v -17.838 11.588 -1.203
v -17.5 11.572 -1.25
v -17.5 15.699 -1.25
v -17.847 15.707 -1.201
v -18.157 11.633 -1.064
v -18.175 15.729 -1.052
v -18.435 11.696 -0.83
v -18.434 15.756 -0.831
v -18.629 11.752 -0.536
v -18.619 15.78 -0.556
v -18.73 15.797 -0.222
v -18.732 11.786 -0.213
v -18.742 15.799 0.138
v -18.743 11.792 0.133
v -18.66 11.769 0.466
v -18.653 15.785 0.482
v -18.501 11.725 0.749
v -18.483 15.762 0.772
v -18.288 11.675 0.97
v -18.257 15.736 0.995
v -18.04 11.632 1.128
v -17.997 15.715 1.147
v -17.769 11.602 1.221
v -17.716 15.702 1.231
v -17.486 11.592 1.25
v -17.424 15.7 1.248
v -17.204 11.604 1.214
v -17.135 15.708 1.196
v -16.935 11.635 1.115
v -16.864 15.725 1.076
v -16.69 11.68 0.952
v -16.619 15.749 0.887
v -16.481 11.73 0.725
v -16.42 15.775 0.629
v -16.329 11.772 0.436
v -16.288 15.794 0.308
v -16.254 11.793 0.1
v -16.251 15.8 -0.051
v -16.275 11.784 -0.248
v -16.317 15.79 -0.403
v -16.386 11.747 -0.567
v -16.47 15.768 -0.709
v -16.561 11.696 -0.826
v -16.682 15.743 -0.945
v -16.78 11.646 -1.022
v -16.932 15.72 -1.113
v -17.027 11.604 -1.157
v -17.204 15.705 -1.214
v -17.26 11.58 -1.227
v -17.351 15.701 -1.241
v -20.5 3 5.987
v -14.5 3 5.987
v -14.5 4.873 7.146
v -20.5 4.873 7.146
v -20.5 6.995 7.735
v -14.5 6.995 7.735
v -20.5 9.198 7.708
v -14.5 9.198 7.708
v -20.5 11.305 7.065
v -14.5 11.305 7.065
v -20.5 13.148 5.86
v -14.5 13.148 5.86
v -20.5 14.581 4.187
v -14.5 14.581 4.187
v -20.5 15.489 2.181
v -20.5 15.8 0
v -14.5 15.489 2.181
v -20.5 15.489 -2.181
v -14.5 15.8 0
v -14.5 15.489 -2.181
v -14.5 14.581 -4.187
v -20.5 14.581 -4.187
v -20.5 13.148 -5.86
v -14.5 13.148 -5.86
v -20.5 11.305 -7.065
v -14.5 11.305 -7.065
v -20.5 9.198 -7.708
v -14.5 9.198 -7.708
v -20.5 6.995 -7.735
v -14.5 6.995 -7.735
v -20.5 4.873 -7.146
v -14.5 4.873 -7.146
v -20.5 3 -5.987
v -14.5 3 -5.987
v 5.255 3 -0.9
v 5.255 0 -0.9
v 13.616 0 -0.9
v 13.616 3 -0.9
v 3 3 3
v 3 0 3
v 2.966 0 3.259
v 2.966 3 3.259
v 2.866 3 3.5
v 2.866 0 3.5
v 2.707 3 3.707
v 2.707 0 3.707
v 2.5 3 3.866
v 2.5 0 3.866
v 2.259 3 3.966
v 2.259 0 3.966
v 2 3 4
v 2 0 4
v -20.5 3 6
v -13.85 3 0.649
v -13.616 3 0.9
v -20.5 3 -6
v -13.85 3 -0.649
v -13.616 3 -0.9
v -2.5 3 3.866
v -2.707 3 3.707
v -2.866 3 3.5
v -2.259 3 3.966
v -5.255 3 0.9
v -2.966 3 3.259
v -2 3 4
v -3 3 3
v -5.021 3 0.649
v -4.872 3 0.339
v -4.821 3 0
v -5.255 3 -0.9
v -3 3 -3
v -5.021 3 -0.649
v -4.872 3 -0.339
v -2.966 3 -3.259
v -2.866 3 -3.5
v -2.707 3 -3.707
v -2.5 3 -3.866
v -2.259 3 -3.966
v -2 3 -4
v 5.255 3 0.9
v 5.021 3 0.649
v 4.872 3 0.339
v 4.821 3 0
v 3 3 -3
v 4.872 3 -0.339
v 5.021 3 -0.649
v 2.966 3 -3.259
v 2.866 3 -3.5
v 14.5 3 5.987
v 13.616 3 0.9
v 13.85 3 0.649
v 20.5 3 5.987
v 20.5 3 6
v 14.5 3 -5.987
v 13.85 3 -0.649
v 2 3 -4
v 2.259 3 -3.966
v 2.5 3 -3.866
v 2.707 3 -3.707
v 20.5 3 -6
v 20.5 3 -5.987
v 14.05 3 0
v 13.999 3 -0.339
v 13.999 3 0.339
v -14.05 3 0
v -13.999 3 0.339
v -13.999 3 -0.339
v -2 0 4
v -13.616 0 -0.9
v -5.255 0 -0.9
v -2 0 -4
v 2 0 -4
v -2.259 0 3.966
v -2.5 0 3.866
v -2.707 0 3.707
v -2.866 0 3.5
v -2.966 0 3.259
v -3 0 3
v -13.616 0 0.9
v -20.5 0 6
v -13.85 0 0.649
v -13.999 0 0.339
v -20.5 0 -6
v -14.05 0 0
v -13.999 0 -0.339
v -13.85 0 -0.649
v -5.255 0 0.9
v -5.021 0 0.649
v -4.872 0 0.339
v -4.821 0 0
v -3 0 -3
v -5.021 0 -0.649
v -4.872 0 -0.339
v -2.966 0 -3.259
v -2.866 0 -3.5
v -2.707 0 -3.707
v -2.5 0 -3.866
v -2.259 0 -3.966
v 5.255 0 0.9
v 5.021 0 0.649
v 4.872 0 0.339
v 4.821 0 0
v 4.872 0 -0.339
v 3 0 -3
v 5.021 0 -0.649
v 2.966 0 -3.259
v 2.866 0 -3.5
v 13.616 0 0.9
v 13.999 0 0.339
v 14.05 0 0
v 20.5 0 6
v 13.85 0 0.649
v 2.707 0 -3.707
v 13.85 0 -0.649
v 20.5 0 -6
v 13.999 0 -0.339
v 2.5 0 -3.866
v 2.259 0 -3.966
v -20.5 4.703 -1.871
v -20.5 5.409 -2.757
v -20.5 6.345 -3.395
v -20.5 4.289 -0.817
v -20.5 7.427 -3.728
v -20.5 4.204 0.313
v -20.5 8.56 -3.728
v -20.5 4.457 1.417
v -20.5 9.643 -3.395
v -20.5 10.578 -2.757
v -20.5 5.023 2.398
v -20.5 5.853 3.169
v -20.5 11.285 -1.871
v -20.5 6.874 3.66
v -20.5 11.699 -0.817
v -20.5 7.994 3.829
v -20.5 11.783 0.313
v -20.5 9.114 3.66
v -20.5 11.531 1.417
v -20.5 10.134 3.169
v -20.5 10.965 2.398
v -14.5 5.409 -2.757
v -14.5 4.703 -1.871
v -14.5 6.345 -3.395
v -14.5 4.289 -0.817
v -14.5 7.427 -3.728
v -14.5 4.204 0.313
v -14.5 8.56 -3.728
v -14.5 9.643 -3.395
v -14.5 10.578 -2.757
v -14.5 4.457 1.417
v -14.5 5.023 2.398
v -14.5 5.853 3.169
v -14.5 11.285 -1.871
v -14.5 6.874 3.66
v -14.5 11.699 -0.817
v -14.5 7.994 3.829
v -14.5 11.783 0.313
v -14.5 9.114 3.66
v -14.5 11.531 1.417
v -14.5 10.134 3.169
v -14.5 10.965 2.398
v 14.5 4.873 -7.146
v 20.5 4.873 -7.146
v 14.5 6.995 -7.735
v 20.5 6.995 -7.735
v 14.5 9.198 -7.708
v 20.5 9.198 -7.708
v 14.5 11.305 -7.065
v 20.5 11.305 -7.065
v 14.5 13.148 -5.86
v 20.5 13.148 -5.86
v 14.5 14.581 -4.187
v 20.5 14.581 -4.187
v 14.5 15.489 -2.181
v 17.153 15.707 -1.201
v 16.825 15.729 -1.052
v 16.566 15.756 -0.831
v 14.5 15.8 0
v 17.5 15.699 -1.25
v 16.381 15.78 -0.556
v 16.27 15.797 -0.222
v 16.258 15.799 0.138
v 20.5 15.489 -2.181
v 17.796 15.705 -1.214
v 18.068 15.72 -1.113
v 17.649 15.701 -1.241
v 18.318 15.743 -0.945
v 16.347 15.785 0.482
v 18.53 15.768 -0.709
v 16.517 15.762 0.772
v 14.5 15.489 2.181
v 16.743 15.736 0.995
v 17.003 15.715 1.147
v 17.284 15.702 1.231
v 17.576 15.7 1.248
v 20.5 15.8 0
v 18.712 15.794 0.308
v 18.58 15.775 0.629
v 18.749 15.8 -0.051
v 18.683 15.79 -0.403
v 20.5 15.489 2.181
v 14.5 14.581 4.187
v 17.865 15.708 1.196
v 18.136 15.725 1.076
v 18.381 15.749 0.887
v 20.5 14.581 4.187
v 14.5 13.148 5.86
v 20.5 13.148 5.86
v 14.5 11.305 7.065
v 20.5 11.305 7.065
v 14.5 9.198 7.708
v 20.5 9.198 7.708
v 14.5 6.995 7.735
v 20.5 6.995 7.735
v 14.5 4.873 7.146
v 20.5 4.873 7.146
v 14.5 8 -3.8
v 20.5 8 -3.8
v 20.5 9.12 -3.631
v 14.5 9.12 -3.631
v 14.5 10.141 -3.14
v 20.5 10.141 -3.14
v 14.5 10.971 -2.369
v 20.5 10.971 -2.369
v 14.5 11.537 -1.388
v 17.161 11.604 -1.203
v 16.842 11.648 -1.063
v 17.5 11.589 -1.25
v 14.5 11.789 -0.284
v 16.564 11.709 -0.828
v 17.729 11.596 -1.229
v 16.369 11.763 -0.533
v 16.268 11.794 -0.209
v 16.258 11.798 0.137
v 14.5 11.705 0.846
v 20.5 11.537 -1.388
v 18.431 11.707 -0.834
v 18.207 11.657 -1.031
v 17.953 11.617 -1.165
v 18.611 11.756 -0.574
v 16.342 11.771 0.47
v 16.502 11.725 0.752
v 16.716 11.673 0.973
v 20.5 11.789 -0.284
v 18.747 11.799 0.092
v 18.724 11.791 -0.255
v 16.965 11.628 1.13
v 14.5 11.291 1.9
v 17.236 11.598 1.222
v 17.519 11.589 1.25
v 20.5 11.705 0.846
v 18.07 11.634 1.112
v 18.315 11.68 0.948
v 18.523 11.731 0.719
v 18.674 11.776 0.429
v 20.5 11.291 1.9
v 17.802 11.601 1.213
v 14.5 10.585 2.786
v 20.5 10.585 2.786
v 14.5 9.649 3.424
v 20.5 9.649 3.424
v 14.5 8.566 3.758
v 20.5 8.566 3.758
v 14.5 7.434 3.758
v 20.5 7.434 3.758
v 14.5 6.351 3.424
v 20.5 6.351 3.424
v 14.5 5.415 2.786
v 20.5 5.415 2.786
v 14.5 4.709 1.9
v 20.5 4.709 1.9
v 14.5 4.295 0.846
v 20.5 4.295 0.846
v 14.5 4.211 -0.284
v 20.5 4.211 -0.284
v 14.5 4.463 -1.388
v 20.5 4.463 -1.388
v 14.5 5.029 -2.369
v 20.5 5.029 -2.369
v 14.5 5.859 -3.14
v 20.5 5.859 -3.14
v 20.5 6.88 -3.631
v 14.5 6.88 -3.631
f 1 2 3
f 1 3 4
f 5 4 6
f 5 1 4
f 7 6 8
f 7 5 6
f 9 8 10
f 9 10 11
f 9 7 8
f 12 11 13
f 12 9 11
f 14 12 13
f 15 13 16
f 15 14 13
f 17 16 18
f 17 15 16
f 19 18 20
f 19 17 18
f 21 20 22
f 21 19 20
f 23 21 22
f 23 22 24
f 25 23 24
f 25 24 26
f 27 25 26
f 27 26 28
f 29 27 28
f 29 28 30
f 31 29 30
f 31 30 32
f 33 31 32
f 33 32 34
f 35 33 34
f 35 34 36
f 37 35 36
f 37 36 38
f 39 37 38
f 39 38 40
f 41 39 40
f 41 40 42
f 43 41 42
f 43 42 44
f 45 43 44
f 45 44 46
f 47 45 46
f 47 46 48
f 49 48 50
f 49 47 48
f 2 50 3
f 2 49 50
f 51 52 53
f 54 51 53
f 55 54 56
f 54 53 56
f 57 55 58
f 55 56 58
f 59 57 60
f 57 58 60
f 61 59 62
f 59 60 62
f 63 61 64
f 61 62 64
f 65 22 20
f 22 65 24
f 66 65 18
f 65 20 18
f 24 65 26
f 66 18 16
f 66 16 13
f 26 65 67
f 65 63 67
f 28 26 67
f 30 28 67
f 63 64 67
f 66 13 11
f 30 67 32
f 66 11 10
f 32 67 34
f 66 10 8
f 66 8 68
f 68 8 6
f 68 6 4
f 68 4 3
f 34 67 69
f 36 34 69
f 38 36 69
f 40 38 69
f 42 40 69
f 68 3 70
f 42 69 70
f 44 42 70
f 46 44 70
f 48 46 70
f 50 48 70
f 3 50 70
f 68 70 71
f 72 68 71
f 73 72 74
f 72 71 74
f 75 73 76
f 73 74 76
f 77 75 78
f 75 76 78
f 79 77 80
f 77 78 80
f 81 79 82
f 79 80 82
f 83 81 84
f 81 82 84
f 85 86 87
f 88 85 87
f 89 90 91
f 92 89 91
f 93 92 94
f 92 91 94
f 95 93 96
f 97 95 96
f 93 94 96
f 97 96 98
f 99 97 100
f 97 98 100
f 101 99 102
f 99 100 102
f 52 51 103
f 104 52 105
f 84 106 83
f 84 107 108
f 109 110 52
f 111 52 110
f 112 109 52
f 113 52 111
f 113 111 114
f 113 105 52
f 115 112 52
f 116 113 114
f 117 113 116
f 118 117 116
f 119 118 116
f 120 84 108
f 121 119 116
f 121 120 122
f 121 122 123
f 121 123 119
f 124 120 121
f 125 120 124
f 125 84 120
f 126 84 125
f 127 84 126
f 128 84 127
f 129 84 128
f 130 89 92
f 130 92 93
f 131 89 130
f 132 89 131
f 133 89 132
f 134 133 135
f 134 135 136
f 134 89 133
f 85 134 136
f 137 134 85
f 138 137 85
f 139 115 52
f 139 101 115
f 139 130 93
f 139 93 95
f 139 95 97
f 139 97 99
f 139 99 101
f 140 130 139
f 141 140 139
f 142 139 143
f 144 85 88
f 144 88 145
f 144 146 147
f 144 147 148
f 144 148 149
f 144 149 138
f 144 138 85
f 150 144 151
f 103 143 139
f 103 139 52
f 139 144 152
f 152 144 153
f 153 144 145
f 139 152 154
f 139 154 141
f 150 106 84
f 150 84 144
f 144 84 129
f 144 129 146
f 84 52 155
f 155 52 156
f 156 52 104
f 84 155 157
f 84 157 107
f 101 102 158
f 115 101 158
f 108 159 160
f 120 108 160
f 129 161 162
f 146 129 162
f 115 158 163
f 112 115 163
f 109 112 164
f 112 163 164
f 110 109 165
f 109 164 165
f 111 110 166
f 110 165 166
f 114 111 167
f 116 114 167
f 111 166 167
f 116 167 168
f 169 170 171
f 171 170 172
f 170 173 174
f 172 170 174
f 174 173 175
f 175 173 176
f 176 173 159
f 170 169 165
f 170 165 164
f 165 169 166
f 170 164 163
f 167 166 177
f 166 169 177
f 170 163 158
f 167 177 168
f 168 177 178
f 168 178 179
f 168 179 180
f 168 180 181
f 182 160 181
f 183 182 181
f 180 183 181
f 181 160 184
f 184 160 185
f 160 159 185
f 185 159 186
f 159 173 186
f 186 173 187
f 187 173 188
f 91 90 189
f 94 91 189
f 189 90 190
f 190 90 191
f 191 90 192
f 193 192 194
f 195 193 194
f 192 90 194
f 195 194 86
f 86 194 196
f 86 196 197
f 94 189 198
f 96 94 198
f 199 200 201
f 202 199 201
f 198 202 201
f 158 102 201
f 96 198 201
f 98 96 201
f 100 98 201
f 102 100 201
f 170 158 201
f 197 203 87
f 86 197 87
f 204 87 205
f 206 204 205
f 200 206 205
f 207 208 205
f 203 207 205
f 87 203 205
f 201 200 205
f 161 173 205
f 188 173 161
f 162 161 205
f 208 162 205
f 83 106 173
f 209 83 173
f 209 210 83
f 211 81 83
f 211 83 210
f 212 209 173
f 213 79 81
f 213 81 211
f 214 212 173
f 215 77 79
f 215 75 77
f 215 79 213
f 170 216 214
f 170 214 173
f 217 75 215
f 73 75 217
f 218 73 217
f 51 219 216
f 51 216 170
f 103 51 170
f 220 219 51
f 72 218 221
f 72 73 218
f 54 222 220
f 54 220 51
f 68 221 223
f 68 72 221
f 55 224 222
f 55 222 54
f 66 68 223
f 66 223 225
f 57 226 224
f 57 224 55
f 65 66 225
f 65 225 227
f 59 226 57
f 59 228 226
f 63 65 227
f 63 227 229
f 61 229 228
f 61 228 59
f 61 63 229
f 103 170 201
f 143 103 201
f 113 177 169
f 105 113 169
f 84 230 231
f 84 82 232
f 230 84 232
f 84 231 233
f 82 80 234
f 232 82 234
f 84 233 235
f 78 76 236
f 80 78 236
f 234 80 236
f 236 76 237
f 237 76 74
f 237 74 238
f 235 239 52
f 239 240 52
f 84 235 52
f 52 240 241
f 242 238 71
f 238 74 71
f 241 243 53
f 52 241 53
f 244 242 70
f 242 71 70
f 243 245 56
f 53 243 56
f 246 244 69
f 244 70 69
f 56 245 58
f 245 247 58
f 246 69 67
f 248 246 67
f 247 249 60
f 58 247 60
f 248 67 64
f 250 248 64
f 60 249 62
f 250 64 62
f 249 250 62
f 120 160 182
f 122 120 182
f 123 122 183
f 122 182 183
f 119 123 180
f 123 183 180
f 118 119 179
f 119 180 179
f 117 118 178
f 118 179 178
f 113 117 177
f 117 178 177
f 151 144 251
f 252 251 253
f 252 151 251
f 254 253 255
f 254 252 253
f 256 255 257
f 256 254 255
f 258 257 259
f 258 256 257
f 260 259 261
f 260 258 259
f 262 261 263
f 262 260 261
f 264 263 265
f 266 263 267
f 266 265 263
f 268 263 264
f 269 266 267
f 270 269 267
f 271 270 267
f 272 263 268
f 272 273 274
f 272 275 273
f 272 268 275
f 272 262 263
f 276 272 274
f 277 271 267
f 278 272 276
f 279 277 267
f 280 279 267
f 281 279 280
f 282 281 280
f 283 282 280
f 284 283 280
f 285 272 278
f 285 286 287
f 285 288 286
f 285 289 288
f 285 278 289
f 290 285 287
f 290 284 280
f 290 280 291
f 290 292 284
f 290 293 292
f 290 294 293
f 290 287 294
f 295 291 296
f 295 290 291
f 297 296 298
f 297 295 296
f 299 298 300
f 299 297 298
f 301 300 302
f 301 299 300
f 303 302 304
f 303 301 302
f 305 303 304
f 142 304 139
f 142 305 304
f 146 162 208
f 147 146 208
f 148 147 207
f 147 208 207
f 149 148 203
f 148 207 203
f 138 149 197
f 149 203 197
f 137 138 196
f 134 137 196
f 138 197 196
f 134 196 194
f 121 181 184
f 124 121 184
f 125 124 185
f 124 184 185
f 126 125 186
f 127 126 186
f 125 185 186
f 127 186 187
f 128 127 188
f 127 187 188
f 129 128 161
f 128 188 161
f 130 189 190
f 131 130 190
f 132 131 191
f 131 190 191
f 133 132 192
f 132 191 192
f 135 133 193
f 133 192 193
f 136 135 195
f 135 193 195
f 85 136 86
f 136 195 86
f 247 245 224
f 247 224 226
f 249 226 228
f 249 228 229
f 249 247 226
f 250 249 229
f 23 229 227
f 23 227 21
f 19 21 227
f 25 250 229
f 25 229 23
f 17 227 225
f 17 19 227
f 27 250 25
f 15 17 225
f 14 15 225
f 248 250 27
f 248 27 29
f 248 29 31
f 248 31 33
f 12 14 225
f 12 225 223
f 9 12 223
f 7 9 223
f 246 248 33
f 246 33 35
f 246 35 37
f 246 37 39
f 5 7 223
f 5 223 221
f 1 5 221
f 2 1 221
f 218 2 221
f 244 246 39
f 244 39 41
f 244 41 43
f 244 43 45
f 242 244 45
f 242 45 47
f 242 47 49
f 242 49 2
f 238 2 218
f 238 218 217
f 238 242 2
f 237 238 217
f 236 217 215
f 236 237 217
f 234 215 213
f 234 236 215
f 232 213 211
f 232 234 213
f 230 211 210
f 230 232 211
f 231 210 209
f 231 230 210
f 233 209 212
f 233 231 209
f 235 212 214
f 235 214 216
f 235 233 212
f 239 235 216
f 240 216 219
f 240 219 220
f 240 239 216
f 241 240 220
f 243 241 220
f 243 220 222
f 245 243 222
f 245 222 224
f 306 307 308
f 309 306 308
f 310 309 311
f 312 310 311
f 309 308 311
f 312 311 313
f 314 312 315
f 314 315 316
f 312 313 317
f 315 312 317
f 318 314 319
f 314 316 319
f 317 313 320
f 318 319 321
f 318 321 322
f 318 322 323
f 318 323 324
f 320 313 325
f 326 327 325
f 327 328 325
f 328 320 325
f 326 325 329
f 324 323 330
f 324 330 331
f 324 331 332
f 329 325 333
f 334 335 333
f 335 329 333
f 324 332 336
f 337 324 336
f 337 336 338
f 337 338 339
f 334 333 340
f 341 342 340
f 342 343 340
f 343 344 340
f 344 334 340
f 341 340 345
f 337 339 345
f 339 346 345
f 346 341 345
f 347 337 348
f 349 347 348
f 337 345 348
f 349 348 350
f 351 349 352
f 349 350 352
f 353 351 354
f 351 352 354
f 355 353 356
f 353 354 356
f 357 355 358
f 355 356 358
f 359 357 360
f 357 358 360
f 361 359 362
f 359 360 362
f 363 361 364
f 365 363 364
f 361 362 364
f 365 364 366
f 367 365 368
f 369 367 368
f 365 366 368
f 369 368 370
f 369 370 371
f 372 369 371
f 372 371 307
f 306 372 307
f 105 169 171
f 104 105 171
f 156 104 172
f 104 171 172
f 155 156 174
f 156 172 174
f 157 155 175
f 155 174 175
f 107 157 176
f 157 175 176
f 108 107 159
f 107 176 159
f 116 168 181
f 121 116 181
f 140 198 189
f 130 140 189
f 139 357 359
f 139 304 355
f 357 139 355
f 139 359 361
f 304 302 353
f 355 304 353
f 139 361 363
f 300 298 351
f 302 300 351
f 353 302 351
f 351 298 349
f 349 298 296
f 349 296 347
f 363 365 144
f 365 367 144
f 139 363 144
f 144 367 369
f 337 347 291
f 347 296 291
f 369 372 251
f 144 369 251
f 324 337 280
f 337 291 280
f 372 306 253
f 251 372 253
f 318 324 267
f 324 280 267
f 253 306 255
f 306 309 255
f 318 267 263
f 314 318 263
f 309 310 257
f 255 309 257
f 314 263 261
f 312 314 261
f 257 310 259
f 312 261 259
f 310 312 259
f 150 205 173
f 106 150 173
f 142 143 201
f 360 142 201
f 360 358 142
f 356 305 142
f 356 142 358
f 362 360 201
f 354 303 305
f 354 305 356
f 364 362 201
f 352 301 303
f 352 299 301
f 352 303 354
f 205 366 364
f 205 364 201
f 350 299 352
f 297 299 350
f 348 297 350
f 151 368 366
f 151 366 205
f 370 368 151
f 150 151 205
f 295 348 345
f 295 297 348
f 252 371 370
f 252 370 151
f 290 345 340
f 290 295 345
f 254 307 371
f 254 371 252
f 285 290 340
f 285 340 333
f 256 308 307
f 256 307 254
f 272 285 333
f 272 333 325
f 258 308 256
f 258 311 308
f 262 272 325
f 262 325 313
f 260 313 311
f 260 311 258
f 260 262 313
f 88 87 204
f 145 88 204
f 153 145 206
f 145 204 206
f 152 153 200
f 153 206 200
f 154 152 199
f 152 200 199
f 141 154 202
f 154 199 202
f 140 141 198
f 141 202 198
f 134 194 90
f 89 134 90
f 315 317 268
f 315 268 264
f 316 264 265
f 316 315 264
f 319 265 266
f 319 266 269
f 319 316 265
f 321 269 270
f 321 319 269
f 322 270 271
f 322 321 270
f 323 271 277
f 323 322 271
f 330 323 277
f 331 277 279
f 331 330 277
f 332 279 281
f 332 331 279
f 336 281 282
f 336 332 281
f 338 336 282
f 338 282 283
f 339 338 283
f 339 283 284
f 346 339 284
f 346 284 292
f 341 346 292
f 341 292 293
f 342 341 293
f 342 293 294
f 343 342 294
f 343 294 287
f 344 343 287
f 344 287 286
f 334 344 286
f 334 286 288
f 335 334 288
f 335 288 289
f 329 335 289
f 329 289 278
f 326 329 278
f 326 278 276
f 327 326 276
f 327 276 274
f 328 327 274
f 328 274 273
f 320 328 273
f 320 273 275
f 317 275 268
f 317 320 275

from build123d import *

# Parameters (mm, degrees)
SKETCH_1_W           = 41
SKETCH_1_H           = 12
EXTRUDE_1_DEPTH      = 3
EXTRUDE_2_DEPTH      = 2.5
EXTRUDE_2_DEPTH_BACK = 3.5
SKETCH_2_R           = 7.8
SKETCH_2_R_2         = 3.8
SKETCH_4_R           = 7.8
SKETCH_4_R_2         = 3.8
EXTRUDE_3_DEPTH      = 6
SKETCH_7_R           = 1.25
CUT_EXTRUDE_1_DEPTH  = 16


with BuildPart() as part:
    # 草图1 → 凸台-拉伸1 (new body)
    with BuildSketch(Plane(origin=(0, 0, 0), x_dir=(1, 0, 0), z_dir=(0, 1, 0))):
        Rectangle(SKETCH_1_W, SKETCH_1_H)
        with BuildLine():
            ThreePointArc((13.615779121, 0.9), (14.049888068, 0), (13.615779121, -0.9))
            Line((13.615779121, -0.9), (5.254817408, -0.9))
            ThreePointArc((5.254817408, -0.9), (4.820708461, 0), (5.254817408, 0.9))
            Line((5.254817408, 0.9), (13.615779121, 0.9))
        make_face(mode=Mode.SUBTRACT)
        with BuildLine():
            Line((2, -4), (-2, -4))
            ThreePointArc((-2, -4), (-2.707106781, -3.707106781), (-3, -3))
            Line((-3, -3), (-3, 3))
            ThreePointArc((-3, 3), (-2.707106781, 3.707106781), (-2, 4))
            Line((-2, 4), (2, 4))
            ThreePointArc((2, 4), (2.707106781, 3.707106781), (3, 3))
            Line((3, 3), (3, -3))
            ThreePointArc((3, -3), (2.707106781, -3.707106781), (2, -4))
        make_face(mode=Mode.SUBTRACT)
        with BuildLine():
            Line((-13.615779121, 0.9), (-5.254817408, 0.9))
            ThreePointArc((-5.254817408, 0.9), (-4.820708461, 0), (-5.254817408, -0.9))
            Line((-5.254817408, -0.9), (-13.615779121, -0.9))
            ThreePointArc((-13.615779121, -0.9), (-14.049888068, 0), (-13.615779121, 0.9))
        make_face(mode=Mode.SUBTRACT)
    extrude(amount=EXTRUDE_1_DEPTH)

    # 草图2 → 凸台-拉伸2 (add, two sides: drawn at the far end of the back side and taken through both)
    with BuildSketch(Plane.ZY.offset(18).offset(-EXTRUDE_2_DEPTH_BACK)):
        with Locations((0, 8)):
            Circle(SKETCH_2_R)
        with Locations((0.029069435, 7.993834456)):
            Circle(SKETCH_2_R_2, mode=Mode.SUBTRACT)
    extrude(amount=EXTRUDE_2_DEPTH + EXTRUDE_2_DEPTH_BACK)

    # 草图4 → 凸台-拉伸3 (add)
    with BuildSketch(Plane(origin=(20.5, 0, 0), x_dir=(0, 0, -1), z_dir=(1, 0, 0))):
        with Locations((0, 8)):
            Circle(SKETCH_4_R)
        with Locations((0, 8)):
            Circle(SKETCH_4_R_2, mode=Mode.SUBTRACT)
    extrude(amount=-EXTRUDE_3_DEPTH)

    # 草图7 → 切除-拉伸1 (cut)
    with BuildSketch(Plane(origin=(0, 7.993834456, 0), x_dir=(1, 0, 0), z_dir=(0, 1, 0))):
        with Locations((-17.5, 0)):
            Circle(SKETCH_7_R)
        with Locations((17.5, 0)):
            Circle(SKETCH_7_R)
    extrude(amount=CUT_EXTRUDE_1_DEPTH, mode=Mode.SUBTRACT)


solid = part.part
